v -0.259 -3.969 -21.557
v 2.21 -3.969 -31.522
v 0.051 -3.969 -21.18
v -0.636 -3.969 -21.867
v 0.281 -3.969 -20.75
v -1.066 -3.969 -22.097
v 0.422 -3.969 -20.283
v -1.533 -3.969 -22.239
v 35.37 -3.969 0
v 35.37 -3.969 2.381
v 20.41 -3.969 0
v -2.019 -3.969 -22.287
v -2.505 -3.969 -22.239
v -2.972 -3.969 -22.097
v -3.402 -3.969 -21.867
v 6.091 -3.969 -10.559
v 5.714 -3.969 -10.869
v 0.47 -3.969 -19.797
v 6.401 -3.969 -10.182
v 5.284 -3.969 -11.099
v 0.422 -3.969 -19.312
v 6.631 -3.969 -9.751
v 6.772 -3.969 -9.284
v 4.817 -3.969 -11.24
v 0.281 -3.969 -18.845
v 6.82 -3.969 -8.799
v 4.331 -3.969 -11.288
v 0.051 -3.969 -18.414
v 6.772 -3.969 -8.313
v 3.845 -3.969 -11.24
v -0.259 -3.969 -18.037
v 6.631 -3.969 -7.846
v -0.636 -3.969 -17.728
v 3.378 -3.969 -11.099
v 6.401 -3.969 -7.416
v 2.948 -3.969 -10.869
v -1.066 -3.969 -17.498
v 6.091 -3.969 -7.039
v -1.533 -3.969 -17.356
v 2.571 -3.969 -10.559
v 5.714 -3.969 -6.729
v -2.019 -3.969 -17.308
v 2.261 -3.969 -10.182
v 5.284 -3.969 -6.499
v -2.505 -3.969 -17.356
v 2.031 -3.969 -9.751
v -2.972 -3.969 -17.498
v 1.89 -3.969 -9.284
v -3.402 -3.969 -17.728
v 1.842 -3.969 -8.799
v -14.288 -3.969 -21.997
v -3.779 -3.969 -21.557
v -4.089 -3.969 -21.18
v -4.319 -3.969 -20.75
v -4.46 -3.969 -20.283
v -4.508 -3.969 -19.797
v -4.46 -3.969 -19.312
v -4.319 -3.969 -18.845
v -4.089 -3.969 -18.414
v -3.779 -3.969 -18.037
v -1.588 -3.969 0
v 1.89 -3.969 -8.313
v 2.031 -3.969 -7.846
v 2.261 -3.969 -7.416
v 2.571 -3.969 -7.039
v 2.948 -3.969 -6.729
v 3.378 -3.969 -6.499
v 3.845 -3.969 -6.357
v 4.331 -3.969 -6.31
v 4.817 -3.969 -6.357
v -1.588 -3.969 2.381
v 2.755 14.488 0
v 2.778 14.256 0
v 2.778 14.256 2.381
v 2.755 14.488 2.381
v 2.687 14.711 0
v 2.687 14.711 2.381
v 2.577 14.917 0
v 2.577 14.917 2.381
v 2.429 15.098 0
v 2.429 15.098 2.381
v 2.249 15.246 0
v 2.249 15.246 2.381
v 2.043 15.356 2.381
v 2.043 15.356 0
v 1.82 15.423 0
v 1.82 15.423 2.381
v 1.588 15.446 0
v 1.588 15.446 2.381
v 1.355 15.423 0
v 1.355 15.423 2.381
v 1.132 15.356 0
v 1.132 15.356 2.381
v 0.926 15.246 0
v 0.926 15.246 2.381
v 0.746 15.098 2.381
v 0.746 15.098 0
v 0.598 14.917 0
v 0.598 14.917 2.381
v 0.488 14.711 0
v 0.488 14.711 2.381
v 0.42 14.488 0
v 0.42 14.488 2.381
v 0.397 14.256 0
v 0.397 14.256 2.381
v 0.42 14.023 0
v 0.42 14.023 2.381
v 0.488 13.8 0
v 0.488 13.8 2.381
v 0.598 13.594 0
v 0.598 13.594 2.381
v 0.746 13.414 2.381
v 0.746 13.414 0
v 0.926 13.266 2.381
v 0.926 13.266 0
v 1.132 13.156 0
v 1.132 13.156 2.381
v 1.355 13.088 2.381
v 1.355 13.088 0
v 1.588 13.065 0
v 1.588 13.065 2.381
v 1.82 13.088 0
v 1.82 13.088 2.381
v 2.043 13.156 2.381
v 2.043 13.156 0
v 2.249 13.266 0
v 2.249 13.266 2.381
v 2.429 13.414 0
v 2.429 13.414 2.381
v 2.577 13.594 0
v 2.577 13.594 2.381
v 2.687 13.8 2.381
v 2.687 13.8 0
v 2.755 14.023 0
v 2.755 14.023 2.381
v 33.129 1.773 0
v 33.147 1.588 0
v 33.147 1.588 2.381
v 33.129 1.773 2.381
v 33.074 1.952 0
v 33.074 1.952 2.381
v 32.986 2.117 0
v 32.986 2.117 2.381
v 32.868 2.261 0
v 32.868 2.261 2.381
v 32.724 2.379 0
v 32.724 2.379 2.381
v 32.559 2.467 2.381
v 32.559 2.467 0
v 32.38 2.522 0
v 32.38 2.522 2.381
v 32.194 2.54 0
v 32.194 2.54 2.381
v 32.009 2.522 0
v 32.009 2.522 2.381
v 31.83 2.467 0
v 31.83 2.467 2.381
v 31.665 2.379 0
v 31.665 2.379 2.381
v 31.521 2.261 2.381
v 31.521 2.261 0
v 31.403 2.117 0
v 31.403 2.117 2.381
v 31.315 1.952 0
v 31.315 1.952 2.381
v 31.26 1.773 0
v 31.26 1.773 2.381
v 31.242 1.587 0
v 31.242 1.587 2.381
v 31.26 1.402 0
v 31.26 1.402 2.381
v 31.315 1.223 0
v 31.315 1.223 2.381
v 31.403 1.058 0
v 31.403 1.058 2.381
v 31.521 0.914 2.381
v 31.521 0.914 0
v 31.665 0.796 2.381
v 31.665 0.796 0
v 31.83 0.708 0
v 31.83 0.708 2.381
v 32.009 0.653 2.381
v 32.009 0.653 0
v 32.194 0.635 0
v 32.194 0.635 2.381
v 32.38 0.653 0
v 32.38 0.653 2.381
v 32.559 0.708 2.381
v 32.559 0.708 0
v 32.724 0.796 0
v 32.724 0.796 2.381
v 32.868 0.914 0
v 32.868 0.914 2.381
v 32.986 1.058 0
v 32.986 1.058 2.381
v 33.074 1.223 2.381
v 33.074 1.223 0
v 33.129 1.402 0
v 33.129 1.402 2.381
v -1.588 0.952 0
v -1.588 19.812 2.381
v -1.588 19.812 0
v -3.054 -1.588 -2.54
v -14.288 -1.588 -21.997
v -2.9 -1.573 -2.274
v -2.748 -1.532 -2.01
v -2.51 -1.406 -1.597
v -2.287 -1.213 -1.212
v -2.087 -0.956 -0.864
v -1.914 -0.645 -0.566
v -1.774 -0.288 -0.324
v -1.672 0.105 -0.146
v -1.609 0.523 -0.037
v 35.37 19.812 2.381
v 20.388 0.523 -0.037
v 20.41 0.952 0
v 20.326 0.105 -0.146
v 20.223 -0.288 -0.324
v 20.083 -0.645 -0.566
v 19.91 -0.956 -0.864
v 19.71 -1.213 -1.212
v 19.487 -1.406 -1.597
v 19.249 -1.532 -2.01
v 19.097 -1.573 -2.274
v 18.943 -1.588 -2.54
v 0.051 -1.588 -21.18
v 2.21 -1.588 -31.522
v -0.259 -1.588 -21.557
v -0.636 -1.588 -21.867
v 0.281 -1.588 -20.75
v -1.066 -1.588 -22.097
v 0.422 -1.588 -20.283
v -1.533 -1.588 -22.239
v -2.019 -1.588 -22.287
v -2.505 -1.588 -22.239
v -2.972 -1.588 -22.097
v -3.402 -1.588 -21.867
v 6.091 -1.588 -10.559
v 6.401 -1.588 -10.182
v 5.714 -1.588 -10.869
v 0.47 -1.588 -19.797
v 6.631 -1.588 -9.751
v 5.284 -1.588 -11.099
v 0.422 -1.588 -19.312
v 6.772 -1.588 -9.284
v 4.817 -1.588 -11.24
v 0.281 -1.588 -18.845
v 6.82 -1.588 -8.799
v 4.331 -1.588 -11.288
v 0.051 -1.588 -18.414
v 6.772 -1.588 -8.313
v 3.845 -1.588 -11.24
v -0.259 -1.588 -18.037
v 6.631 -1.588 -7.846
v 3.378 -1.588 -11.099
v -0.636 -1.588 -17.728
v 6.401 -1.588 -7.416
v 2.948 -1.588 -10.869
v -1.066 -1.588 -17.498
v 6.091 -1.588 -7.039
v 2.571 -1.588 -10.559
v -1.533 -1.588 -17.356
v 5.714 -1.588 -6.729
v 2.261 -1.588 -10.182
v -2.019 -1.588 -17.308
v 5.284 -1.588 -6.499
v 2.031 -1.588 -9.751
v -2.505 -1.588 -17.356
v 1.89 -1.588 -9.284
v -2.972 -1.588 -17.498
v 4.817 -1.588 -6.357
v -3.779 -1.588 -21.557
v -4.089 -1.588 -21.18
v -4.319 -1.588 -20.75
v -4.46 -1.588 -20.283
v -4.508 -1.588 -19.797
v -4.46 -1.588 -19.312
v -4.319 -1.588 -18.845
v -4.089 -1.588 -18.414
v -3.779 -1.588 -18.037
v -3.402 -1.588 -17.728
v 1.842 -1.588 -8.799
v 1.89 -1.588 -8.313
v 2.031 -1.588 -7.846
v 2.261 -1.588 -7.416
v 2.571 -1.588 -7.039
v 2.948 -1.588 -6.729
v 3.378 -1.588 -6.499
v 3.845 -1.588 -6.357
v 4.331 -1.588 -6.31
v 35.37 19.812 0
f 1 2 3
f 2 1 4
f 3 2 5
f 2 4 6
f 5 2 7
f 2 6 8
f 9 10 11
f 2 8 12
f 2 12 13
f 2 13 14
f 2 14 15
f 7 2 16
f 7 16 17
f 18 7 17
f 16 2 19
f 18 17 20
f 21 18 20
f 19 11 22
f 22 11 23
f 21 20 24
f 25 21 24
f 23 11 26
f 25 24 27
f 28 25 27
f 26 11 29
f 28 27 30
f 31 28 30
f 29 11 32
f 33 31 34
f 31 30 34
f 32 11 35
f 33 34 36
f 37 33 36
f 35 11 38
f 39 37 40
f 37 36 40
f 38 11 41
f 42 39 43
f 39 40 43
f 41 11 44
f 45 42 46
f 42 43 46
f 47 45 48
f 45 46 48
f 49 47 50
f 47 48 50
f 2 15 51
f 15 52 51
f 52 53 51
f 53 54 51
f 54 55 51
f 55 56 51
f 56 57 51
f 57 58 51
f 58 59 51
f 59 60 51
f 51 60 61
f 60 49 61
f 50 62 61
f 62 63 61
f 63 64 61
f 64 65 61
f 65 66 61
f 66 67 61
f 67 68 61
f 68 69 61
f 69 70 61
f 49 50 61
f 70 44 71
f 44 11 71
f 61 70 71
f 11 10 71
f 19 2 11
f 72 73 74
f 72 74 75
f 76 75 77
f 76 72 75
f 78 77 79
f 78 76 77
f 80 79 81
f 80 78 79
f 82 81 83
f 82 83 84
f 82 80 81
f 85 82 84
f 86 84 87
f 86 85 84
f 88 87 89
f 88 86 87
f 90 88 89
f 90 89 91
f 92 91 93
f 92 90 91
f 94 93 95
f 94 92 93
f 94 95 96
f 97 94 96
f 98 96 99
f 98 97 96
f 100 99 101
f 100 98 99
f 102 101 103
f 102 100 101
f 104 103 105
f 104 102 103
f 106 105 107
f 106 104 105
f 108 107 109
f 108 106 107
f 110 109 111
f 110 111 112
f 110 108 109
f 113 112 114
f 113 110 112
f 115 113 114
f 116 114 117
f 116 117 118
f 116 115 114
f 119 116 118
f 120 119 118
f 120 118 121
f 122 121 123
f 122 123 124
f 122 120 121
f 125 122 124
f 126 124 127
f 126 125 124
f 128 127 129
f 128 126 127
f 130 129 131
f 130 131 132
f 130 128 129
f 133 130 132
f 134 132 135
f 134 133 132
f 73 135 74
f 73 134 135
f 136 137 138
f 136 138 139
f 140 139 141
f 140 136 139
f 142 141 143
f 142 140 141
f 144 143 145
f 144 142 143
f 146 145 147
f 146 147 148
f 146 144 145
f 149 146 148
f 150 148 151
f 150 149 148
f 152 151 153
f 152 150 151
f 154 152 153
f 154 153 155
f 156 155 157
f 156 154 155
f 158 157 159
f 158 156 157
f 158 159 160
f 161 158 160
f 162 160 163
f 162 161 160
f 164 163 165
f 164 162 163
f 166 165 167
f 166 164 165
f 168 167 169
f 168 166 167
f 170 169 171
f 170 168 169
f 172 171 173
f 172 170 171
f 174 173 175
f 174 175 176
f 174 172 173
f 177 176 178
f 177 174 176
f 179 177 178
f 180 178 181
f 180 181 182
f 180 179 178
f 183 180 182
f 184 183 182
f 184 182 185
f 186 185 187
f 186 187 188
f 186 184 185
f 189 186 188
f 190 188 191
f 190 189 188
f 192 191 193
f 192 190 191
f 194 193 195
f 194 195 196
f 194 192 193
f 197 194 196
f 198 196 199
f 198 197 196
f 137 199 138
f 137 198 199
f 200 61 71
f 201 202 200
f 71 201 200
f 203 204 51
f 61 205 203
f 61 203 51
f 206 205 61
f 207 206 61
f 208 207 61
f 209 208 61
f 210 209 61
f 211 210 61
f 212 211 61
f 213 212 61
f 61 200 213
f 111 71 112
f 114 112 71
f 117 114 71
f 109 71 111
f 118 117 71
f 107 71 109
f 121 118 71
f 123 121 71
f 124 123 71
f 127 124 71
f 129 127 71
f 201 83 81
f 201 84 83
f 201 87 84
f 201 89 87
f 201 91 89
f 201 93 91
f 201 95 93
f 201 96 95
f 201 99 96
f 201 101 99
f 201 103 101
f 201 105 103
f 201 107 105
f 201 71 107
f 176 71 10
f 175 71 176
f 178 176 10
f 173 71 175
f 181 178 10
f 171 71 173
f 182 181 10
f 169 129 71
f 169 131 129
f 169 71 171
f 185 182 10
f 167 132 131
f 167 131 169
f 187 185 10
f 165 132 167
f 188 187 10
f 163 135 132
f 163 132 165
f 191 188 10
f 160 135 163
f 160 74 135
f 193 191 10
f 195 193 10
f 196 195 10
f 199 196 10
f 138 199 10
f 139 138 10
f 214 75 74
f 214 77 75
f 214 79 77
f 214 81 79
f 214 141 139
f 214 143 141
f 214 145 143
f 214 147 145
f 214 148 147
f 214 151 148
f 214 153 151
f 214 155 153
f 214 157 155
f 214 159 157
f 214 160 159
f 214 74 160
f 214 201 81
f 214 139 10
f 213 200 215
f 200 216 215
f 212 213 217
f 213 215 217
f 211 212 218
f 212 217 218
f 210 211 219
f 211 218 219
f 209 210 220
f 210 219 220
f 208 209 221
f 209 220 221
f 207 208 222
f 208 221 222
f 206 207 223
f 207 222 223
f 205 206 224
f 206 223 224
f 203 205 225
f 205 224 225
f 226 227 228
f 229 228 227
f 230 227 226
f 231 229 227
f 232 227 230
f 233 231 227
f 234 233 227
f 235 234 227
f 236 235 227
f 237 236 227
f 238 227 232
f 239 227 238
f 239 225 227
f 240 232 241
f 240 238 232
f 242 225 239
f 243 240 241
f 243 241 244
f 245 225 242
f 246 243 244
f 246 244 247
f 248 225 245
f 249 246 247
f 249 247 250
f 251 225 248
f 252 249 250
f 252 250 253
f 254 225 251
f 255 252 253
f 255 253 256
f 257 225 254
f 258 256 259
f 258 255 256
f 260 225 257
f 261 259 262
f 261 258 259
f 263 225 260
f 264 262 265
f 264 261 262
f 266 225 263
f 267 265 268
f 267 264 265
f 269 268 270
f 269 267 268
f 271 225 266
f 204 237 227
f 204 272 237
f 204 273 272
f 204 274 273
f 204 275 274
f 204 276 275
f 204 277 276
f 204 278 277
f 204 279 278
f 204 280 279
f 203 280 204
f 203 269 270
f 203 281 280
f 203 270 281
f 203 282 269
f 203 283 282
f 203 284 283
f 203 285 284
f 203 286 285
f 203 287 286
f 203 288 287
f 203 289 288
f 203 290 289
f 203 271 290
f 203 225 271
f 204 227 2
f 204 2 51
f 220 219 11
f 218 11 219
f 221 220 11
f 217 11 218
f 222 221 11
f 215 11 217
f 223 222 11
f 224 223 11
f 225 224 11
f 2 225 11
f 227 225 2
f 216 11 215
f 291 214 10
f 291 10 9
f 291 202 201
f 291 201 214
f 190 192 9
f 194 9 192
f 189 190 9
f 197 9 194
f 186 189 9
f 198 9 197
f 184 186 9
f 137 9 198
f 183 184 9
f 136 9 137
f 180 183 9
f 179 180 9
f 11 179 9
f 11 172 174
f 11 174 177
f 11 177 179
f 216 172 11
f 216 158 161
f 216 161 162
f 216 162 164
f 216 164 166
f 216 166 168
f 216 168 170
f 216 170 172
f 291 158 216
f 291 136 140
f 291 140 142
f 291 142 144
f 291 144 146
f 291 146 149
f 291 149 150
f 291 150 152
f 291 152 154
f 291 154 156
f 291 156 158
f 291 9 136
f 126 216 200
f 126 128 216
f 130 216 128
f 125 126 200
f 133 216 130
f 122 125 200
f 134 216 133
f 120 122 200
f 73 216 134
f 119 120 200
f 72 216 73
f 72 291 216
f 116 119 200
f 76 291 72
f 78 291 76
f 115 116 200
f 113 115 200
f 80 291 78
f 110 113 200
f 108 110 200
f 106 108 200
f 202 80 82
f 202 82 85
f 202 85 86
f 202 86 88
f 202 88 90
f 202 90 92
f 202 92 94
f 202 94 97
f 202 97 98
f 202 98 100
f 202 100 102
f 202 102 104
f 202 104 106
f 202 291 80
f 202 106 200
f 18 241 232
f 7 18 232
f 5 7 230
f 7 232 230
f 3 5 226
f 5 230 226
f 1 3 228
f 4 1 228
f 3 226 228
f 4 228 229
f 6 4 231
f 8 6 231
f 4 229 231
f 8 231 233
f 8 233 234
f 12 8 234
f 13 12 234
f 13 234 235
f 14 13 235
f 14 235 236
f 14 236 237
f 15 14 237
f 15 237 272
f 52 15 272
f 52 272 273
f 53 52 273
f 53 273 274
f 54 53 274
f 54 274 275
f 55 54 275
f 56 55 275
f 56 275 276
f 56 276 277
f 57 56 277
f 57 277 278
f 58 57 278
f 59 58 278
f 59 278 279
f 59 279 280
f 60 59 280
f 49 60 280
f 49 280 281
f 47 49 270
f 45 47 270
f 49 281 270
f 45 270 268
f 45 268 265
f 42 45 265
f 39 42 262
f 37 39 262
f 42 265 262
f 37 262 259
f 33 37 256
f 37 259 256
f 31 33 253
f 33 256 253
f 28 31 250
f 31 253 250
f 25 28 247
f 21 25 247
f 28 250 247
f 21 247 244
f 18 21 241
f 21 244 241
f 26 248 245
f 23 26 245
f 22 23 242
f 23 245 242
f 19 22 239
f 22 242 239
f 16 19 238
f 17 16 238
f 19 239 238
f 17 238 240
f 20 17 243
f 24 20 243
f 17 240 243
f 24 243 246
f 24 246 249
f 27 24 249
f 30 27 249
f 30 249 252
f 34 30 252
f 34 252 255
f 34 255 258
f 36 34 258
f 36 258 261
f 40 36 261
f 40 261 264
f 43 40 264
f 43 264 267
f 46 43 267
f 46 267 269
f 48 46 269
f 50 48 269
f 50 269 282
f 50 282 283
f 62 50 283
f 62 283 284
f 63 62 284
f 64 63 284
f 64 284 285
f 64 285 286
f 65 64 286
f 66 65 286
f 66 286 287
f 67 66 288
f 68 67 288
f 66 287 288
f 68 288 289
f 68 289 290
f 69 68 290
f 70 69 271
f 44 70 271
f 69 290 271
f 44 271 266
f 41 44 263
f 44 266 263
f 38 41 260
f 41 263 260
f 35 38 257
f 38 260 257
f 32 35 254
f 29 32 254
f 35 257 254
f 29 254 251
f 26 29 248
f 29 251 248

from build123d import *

# Parameters (mm, degrees)
SKETCH1_W           = 36.957
SKETCH1_H           = 21.3995
SKETCH1_R           = 1.190625
SKETCH1_R_2         = 0.9525
BOSS_EXTRUDE1_DEPTH = 2.38125
BOSS_EXTRUDE3_DEPTH = 2.38125
CUT_EXTRUDE2_REACH  = 4.381
SKETCH4_R           = 2.4892
FILLET1_R           = 2.54


with BuildPart() as part:
    # Sketch1 → Boss-Extrude1 (new body)
    with BuildSketch(Plane.XY):
        with Locations((16.891, 9.11225)):
            Rectangle(SKETCH1_W, SKETCH1_H)
        with Locations((1.5875, 14.25575)):
            Circle(SKETCH1_R, mode=Mode.SUBTRACT)
        with Locations((32.1945, 1.5875)):
            Circle(SKETCH1_R_2, mode=Mode.SUBTRACT)
    extrude(amount=BOSS_EXTRUDE1_DEPTH)

    # Sketch2 → Boss-Extrude3 (add)
    with BuildSketch(Plane.XZ.offset(1.5875)):
        Polygon((-1.5875, 2.38125), (35.3695, 2.38125), (35.3695, 0), (20.409545256, 0), (2.210283942, -31.522045256), (-14.2875, -21.997045256), (-1.5875, 0), align=None)
    extrude(amount=BOSS_EXTRUDE3_DEPTH)

    # Sketch4 → Cut-Extrude2 (cut, up to next)
    with BuildSketch(Plane(origin=(0, -1.5875, 0), x_dir=(1, 0, 0), z_dir=(0, 1, 0)), mode=Mode.PRIVATE) as cut_extrude2_sk1:
        with Locations((-2.018977372, 19.797340731)):
            Circle(SKETCH4_R)
    cut_extrude2_tool1 = extrude(cut_extrude2_sk1.sketch, amount=-CUT_EXTRUDE2_REACH, mode=Mode.PRIVATE) & part.part
    add(cut_extrude2_tool1.solids().sort_by_distance((-2.018977, -1.5875, -19.797341))[0], mode=Mode.SUBTRACT)
    # Sketch4 → Cut-Extrude2 (cut, up to next)
    with BuildSketch(Plane(origin=(0, -1.5875, 0), x_dir=(1, 0, 0), z_dir=(0, 1, 0)), mode=Mode.PRIVATE) as cut_extrude2_sk2:
        with Locations((4.331022628, 8.798818102)):
            Circle(SKETCH4_R)
    cut_extrude2_tool2 = extrude(cut_extrude2_sk2.sketch, amount=-CUT_EXTRUDE2_REACH, mode=Mode.PRIVATE) & part.part
    add(cut_extrude2_tool2.solids().sort_by_distance((4.331023, -1.5875, -8.798818))[0], mode=Mode.SUBTRACT)

    # Fillet1
    fillet1_edges = [part.edges().sort_by_distance(p)[0] for p in [
        (9.411022628, -1.5875, 0),
    ]]
    fillet(fillet1_edges, radius=FILLET1_R)


solid = part.part
